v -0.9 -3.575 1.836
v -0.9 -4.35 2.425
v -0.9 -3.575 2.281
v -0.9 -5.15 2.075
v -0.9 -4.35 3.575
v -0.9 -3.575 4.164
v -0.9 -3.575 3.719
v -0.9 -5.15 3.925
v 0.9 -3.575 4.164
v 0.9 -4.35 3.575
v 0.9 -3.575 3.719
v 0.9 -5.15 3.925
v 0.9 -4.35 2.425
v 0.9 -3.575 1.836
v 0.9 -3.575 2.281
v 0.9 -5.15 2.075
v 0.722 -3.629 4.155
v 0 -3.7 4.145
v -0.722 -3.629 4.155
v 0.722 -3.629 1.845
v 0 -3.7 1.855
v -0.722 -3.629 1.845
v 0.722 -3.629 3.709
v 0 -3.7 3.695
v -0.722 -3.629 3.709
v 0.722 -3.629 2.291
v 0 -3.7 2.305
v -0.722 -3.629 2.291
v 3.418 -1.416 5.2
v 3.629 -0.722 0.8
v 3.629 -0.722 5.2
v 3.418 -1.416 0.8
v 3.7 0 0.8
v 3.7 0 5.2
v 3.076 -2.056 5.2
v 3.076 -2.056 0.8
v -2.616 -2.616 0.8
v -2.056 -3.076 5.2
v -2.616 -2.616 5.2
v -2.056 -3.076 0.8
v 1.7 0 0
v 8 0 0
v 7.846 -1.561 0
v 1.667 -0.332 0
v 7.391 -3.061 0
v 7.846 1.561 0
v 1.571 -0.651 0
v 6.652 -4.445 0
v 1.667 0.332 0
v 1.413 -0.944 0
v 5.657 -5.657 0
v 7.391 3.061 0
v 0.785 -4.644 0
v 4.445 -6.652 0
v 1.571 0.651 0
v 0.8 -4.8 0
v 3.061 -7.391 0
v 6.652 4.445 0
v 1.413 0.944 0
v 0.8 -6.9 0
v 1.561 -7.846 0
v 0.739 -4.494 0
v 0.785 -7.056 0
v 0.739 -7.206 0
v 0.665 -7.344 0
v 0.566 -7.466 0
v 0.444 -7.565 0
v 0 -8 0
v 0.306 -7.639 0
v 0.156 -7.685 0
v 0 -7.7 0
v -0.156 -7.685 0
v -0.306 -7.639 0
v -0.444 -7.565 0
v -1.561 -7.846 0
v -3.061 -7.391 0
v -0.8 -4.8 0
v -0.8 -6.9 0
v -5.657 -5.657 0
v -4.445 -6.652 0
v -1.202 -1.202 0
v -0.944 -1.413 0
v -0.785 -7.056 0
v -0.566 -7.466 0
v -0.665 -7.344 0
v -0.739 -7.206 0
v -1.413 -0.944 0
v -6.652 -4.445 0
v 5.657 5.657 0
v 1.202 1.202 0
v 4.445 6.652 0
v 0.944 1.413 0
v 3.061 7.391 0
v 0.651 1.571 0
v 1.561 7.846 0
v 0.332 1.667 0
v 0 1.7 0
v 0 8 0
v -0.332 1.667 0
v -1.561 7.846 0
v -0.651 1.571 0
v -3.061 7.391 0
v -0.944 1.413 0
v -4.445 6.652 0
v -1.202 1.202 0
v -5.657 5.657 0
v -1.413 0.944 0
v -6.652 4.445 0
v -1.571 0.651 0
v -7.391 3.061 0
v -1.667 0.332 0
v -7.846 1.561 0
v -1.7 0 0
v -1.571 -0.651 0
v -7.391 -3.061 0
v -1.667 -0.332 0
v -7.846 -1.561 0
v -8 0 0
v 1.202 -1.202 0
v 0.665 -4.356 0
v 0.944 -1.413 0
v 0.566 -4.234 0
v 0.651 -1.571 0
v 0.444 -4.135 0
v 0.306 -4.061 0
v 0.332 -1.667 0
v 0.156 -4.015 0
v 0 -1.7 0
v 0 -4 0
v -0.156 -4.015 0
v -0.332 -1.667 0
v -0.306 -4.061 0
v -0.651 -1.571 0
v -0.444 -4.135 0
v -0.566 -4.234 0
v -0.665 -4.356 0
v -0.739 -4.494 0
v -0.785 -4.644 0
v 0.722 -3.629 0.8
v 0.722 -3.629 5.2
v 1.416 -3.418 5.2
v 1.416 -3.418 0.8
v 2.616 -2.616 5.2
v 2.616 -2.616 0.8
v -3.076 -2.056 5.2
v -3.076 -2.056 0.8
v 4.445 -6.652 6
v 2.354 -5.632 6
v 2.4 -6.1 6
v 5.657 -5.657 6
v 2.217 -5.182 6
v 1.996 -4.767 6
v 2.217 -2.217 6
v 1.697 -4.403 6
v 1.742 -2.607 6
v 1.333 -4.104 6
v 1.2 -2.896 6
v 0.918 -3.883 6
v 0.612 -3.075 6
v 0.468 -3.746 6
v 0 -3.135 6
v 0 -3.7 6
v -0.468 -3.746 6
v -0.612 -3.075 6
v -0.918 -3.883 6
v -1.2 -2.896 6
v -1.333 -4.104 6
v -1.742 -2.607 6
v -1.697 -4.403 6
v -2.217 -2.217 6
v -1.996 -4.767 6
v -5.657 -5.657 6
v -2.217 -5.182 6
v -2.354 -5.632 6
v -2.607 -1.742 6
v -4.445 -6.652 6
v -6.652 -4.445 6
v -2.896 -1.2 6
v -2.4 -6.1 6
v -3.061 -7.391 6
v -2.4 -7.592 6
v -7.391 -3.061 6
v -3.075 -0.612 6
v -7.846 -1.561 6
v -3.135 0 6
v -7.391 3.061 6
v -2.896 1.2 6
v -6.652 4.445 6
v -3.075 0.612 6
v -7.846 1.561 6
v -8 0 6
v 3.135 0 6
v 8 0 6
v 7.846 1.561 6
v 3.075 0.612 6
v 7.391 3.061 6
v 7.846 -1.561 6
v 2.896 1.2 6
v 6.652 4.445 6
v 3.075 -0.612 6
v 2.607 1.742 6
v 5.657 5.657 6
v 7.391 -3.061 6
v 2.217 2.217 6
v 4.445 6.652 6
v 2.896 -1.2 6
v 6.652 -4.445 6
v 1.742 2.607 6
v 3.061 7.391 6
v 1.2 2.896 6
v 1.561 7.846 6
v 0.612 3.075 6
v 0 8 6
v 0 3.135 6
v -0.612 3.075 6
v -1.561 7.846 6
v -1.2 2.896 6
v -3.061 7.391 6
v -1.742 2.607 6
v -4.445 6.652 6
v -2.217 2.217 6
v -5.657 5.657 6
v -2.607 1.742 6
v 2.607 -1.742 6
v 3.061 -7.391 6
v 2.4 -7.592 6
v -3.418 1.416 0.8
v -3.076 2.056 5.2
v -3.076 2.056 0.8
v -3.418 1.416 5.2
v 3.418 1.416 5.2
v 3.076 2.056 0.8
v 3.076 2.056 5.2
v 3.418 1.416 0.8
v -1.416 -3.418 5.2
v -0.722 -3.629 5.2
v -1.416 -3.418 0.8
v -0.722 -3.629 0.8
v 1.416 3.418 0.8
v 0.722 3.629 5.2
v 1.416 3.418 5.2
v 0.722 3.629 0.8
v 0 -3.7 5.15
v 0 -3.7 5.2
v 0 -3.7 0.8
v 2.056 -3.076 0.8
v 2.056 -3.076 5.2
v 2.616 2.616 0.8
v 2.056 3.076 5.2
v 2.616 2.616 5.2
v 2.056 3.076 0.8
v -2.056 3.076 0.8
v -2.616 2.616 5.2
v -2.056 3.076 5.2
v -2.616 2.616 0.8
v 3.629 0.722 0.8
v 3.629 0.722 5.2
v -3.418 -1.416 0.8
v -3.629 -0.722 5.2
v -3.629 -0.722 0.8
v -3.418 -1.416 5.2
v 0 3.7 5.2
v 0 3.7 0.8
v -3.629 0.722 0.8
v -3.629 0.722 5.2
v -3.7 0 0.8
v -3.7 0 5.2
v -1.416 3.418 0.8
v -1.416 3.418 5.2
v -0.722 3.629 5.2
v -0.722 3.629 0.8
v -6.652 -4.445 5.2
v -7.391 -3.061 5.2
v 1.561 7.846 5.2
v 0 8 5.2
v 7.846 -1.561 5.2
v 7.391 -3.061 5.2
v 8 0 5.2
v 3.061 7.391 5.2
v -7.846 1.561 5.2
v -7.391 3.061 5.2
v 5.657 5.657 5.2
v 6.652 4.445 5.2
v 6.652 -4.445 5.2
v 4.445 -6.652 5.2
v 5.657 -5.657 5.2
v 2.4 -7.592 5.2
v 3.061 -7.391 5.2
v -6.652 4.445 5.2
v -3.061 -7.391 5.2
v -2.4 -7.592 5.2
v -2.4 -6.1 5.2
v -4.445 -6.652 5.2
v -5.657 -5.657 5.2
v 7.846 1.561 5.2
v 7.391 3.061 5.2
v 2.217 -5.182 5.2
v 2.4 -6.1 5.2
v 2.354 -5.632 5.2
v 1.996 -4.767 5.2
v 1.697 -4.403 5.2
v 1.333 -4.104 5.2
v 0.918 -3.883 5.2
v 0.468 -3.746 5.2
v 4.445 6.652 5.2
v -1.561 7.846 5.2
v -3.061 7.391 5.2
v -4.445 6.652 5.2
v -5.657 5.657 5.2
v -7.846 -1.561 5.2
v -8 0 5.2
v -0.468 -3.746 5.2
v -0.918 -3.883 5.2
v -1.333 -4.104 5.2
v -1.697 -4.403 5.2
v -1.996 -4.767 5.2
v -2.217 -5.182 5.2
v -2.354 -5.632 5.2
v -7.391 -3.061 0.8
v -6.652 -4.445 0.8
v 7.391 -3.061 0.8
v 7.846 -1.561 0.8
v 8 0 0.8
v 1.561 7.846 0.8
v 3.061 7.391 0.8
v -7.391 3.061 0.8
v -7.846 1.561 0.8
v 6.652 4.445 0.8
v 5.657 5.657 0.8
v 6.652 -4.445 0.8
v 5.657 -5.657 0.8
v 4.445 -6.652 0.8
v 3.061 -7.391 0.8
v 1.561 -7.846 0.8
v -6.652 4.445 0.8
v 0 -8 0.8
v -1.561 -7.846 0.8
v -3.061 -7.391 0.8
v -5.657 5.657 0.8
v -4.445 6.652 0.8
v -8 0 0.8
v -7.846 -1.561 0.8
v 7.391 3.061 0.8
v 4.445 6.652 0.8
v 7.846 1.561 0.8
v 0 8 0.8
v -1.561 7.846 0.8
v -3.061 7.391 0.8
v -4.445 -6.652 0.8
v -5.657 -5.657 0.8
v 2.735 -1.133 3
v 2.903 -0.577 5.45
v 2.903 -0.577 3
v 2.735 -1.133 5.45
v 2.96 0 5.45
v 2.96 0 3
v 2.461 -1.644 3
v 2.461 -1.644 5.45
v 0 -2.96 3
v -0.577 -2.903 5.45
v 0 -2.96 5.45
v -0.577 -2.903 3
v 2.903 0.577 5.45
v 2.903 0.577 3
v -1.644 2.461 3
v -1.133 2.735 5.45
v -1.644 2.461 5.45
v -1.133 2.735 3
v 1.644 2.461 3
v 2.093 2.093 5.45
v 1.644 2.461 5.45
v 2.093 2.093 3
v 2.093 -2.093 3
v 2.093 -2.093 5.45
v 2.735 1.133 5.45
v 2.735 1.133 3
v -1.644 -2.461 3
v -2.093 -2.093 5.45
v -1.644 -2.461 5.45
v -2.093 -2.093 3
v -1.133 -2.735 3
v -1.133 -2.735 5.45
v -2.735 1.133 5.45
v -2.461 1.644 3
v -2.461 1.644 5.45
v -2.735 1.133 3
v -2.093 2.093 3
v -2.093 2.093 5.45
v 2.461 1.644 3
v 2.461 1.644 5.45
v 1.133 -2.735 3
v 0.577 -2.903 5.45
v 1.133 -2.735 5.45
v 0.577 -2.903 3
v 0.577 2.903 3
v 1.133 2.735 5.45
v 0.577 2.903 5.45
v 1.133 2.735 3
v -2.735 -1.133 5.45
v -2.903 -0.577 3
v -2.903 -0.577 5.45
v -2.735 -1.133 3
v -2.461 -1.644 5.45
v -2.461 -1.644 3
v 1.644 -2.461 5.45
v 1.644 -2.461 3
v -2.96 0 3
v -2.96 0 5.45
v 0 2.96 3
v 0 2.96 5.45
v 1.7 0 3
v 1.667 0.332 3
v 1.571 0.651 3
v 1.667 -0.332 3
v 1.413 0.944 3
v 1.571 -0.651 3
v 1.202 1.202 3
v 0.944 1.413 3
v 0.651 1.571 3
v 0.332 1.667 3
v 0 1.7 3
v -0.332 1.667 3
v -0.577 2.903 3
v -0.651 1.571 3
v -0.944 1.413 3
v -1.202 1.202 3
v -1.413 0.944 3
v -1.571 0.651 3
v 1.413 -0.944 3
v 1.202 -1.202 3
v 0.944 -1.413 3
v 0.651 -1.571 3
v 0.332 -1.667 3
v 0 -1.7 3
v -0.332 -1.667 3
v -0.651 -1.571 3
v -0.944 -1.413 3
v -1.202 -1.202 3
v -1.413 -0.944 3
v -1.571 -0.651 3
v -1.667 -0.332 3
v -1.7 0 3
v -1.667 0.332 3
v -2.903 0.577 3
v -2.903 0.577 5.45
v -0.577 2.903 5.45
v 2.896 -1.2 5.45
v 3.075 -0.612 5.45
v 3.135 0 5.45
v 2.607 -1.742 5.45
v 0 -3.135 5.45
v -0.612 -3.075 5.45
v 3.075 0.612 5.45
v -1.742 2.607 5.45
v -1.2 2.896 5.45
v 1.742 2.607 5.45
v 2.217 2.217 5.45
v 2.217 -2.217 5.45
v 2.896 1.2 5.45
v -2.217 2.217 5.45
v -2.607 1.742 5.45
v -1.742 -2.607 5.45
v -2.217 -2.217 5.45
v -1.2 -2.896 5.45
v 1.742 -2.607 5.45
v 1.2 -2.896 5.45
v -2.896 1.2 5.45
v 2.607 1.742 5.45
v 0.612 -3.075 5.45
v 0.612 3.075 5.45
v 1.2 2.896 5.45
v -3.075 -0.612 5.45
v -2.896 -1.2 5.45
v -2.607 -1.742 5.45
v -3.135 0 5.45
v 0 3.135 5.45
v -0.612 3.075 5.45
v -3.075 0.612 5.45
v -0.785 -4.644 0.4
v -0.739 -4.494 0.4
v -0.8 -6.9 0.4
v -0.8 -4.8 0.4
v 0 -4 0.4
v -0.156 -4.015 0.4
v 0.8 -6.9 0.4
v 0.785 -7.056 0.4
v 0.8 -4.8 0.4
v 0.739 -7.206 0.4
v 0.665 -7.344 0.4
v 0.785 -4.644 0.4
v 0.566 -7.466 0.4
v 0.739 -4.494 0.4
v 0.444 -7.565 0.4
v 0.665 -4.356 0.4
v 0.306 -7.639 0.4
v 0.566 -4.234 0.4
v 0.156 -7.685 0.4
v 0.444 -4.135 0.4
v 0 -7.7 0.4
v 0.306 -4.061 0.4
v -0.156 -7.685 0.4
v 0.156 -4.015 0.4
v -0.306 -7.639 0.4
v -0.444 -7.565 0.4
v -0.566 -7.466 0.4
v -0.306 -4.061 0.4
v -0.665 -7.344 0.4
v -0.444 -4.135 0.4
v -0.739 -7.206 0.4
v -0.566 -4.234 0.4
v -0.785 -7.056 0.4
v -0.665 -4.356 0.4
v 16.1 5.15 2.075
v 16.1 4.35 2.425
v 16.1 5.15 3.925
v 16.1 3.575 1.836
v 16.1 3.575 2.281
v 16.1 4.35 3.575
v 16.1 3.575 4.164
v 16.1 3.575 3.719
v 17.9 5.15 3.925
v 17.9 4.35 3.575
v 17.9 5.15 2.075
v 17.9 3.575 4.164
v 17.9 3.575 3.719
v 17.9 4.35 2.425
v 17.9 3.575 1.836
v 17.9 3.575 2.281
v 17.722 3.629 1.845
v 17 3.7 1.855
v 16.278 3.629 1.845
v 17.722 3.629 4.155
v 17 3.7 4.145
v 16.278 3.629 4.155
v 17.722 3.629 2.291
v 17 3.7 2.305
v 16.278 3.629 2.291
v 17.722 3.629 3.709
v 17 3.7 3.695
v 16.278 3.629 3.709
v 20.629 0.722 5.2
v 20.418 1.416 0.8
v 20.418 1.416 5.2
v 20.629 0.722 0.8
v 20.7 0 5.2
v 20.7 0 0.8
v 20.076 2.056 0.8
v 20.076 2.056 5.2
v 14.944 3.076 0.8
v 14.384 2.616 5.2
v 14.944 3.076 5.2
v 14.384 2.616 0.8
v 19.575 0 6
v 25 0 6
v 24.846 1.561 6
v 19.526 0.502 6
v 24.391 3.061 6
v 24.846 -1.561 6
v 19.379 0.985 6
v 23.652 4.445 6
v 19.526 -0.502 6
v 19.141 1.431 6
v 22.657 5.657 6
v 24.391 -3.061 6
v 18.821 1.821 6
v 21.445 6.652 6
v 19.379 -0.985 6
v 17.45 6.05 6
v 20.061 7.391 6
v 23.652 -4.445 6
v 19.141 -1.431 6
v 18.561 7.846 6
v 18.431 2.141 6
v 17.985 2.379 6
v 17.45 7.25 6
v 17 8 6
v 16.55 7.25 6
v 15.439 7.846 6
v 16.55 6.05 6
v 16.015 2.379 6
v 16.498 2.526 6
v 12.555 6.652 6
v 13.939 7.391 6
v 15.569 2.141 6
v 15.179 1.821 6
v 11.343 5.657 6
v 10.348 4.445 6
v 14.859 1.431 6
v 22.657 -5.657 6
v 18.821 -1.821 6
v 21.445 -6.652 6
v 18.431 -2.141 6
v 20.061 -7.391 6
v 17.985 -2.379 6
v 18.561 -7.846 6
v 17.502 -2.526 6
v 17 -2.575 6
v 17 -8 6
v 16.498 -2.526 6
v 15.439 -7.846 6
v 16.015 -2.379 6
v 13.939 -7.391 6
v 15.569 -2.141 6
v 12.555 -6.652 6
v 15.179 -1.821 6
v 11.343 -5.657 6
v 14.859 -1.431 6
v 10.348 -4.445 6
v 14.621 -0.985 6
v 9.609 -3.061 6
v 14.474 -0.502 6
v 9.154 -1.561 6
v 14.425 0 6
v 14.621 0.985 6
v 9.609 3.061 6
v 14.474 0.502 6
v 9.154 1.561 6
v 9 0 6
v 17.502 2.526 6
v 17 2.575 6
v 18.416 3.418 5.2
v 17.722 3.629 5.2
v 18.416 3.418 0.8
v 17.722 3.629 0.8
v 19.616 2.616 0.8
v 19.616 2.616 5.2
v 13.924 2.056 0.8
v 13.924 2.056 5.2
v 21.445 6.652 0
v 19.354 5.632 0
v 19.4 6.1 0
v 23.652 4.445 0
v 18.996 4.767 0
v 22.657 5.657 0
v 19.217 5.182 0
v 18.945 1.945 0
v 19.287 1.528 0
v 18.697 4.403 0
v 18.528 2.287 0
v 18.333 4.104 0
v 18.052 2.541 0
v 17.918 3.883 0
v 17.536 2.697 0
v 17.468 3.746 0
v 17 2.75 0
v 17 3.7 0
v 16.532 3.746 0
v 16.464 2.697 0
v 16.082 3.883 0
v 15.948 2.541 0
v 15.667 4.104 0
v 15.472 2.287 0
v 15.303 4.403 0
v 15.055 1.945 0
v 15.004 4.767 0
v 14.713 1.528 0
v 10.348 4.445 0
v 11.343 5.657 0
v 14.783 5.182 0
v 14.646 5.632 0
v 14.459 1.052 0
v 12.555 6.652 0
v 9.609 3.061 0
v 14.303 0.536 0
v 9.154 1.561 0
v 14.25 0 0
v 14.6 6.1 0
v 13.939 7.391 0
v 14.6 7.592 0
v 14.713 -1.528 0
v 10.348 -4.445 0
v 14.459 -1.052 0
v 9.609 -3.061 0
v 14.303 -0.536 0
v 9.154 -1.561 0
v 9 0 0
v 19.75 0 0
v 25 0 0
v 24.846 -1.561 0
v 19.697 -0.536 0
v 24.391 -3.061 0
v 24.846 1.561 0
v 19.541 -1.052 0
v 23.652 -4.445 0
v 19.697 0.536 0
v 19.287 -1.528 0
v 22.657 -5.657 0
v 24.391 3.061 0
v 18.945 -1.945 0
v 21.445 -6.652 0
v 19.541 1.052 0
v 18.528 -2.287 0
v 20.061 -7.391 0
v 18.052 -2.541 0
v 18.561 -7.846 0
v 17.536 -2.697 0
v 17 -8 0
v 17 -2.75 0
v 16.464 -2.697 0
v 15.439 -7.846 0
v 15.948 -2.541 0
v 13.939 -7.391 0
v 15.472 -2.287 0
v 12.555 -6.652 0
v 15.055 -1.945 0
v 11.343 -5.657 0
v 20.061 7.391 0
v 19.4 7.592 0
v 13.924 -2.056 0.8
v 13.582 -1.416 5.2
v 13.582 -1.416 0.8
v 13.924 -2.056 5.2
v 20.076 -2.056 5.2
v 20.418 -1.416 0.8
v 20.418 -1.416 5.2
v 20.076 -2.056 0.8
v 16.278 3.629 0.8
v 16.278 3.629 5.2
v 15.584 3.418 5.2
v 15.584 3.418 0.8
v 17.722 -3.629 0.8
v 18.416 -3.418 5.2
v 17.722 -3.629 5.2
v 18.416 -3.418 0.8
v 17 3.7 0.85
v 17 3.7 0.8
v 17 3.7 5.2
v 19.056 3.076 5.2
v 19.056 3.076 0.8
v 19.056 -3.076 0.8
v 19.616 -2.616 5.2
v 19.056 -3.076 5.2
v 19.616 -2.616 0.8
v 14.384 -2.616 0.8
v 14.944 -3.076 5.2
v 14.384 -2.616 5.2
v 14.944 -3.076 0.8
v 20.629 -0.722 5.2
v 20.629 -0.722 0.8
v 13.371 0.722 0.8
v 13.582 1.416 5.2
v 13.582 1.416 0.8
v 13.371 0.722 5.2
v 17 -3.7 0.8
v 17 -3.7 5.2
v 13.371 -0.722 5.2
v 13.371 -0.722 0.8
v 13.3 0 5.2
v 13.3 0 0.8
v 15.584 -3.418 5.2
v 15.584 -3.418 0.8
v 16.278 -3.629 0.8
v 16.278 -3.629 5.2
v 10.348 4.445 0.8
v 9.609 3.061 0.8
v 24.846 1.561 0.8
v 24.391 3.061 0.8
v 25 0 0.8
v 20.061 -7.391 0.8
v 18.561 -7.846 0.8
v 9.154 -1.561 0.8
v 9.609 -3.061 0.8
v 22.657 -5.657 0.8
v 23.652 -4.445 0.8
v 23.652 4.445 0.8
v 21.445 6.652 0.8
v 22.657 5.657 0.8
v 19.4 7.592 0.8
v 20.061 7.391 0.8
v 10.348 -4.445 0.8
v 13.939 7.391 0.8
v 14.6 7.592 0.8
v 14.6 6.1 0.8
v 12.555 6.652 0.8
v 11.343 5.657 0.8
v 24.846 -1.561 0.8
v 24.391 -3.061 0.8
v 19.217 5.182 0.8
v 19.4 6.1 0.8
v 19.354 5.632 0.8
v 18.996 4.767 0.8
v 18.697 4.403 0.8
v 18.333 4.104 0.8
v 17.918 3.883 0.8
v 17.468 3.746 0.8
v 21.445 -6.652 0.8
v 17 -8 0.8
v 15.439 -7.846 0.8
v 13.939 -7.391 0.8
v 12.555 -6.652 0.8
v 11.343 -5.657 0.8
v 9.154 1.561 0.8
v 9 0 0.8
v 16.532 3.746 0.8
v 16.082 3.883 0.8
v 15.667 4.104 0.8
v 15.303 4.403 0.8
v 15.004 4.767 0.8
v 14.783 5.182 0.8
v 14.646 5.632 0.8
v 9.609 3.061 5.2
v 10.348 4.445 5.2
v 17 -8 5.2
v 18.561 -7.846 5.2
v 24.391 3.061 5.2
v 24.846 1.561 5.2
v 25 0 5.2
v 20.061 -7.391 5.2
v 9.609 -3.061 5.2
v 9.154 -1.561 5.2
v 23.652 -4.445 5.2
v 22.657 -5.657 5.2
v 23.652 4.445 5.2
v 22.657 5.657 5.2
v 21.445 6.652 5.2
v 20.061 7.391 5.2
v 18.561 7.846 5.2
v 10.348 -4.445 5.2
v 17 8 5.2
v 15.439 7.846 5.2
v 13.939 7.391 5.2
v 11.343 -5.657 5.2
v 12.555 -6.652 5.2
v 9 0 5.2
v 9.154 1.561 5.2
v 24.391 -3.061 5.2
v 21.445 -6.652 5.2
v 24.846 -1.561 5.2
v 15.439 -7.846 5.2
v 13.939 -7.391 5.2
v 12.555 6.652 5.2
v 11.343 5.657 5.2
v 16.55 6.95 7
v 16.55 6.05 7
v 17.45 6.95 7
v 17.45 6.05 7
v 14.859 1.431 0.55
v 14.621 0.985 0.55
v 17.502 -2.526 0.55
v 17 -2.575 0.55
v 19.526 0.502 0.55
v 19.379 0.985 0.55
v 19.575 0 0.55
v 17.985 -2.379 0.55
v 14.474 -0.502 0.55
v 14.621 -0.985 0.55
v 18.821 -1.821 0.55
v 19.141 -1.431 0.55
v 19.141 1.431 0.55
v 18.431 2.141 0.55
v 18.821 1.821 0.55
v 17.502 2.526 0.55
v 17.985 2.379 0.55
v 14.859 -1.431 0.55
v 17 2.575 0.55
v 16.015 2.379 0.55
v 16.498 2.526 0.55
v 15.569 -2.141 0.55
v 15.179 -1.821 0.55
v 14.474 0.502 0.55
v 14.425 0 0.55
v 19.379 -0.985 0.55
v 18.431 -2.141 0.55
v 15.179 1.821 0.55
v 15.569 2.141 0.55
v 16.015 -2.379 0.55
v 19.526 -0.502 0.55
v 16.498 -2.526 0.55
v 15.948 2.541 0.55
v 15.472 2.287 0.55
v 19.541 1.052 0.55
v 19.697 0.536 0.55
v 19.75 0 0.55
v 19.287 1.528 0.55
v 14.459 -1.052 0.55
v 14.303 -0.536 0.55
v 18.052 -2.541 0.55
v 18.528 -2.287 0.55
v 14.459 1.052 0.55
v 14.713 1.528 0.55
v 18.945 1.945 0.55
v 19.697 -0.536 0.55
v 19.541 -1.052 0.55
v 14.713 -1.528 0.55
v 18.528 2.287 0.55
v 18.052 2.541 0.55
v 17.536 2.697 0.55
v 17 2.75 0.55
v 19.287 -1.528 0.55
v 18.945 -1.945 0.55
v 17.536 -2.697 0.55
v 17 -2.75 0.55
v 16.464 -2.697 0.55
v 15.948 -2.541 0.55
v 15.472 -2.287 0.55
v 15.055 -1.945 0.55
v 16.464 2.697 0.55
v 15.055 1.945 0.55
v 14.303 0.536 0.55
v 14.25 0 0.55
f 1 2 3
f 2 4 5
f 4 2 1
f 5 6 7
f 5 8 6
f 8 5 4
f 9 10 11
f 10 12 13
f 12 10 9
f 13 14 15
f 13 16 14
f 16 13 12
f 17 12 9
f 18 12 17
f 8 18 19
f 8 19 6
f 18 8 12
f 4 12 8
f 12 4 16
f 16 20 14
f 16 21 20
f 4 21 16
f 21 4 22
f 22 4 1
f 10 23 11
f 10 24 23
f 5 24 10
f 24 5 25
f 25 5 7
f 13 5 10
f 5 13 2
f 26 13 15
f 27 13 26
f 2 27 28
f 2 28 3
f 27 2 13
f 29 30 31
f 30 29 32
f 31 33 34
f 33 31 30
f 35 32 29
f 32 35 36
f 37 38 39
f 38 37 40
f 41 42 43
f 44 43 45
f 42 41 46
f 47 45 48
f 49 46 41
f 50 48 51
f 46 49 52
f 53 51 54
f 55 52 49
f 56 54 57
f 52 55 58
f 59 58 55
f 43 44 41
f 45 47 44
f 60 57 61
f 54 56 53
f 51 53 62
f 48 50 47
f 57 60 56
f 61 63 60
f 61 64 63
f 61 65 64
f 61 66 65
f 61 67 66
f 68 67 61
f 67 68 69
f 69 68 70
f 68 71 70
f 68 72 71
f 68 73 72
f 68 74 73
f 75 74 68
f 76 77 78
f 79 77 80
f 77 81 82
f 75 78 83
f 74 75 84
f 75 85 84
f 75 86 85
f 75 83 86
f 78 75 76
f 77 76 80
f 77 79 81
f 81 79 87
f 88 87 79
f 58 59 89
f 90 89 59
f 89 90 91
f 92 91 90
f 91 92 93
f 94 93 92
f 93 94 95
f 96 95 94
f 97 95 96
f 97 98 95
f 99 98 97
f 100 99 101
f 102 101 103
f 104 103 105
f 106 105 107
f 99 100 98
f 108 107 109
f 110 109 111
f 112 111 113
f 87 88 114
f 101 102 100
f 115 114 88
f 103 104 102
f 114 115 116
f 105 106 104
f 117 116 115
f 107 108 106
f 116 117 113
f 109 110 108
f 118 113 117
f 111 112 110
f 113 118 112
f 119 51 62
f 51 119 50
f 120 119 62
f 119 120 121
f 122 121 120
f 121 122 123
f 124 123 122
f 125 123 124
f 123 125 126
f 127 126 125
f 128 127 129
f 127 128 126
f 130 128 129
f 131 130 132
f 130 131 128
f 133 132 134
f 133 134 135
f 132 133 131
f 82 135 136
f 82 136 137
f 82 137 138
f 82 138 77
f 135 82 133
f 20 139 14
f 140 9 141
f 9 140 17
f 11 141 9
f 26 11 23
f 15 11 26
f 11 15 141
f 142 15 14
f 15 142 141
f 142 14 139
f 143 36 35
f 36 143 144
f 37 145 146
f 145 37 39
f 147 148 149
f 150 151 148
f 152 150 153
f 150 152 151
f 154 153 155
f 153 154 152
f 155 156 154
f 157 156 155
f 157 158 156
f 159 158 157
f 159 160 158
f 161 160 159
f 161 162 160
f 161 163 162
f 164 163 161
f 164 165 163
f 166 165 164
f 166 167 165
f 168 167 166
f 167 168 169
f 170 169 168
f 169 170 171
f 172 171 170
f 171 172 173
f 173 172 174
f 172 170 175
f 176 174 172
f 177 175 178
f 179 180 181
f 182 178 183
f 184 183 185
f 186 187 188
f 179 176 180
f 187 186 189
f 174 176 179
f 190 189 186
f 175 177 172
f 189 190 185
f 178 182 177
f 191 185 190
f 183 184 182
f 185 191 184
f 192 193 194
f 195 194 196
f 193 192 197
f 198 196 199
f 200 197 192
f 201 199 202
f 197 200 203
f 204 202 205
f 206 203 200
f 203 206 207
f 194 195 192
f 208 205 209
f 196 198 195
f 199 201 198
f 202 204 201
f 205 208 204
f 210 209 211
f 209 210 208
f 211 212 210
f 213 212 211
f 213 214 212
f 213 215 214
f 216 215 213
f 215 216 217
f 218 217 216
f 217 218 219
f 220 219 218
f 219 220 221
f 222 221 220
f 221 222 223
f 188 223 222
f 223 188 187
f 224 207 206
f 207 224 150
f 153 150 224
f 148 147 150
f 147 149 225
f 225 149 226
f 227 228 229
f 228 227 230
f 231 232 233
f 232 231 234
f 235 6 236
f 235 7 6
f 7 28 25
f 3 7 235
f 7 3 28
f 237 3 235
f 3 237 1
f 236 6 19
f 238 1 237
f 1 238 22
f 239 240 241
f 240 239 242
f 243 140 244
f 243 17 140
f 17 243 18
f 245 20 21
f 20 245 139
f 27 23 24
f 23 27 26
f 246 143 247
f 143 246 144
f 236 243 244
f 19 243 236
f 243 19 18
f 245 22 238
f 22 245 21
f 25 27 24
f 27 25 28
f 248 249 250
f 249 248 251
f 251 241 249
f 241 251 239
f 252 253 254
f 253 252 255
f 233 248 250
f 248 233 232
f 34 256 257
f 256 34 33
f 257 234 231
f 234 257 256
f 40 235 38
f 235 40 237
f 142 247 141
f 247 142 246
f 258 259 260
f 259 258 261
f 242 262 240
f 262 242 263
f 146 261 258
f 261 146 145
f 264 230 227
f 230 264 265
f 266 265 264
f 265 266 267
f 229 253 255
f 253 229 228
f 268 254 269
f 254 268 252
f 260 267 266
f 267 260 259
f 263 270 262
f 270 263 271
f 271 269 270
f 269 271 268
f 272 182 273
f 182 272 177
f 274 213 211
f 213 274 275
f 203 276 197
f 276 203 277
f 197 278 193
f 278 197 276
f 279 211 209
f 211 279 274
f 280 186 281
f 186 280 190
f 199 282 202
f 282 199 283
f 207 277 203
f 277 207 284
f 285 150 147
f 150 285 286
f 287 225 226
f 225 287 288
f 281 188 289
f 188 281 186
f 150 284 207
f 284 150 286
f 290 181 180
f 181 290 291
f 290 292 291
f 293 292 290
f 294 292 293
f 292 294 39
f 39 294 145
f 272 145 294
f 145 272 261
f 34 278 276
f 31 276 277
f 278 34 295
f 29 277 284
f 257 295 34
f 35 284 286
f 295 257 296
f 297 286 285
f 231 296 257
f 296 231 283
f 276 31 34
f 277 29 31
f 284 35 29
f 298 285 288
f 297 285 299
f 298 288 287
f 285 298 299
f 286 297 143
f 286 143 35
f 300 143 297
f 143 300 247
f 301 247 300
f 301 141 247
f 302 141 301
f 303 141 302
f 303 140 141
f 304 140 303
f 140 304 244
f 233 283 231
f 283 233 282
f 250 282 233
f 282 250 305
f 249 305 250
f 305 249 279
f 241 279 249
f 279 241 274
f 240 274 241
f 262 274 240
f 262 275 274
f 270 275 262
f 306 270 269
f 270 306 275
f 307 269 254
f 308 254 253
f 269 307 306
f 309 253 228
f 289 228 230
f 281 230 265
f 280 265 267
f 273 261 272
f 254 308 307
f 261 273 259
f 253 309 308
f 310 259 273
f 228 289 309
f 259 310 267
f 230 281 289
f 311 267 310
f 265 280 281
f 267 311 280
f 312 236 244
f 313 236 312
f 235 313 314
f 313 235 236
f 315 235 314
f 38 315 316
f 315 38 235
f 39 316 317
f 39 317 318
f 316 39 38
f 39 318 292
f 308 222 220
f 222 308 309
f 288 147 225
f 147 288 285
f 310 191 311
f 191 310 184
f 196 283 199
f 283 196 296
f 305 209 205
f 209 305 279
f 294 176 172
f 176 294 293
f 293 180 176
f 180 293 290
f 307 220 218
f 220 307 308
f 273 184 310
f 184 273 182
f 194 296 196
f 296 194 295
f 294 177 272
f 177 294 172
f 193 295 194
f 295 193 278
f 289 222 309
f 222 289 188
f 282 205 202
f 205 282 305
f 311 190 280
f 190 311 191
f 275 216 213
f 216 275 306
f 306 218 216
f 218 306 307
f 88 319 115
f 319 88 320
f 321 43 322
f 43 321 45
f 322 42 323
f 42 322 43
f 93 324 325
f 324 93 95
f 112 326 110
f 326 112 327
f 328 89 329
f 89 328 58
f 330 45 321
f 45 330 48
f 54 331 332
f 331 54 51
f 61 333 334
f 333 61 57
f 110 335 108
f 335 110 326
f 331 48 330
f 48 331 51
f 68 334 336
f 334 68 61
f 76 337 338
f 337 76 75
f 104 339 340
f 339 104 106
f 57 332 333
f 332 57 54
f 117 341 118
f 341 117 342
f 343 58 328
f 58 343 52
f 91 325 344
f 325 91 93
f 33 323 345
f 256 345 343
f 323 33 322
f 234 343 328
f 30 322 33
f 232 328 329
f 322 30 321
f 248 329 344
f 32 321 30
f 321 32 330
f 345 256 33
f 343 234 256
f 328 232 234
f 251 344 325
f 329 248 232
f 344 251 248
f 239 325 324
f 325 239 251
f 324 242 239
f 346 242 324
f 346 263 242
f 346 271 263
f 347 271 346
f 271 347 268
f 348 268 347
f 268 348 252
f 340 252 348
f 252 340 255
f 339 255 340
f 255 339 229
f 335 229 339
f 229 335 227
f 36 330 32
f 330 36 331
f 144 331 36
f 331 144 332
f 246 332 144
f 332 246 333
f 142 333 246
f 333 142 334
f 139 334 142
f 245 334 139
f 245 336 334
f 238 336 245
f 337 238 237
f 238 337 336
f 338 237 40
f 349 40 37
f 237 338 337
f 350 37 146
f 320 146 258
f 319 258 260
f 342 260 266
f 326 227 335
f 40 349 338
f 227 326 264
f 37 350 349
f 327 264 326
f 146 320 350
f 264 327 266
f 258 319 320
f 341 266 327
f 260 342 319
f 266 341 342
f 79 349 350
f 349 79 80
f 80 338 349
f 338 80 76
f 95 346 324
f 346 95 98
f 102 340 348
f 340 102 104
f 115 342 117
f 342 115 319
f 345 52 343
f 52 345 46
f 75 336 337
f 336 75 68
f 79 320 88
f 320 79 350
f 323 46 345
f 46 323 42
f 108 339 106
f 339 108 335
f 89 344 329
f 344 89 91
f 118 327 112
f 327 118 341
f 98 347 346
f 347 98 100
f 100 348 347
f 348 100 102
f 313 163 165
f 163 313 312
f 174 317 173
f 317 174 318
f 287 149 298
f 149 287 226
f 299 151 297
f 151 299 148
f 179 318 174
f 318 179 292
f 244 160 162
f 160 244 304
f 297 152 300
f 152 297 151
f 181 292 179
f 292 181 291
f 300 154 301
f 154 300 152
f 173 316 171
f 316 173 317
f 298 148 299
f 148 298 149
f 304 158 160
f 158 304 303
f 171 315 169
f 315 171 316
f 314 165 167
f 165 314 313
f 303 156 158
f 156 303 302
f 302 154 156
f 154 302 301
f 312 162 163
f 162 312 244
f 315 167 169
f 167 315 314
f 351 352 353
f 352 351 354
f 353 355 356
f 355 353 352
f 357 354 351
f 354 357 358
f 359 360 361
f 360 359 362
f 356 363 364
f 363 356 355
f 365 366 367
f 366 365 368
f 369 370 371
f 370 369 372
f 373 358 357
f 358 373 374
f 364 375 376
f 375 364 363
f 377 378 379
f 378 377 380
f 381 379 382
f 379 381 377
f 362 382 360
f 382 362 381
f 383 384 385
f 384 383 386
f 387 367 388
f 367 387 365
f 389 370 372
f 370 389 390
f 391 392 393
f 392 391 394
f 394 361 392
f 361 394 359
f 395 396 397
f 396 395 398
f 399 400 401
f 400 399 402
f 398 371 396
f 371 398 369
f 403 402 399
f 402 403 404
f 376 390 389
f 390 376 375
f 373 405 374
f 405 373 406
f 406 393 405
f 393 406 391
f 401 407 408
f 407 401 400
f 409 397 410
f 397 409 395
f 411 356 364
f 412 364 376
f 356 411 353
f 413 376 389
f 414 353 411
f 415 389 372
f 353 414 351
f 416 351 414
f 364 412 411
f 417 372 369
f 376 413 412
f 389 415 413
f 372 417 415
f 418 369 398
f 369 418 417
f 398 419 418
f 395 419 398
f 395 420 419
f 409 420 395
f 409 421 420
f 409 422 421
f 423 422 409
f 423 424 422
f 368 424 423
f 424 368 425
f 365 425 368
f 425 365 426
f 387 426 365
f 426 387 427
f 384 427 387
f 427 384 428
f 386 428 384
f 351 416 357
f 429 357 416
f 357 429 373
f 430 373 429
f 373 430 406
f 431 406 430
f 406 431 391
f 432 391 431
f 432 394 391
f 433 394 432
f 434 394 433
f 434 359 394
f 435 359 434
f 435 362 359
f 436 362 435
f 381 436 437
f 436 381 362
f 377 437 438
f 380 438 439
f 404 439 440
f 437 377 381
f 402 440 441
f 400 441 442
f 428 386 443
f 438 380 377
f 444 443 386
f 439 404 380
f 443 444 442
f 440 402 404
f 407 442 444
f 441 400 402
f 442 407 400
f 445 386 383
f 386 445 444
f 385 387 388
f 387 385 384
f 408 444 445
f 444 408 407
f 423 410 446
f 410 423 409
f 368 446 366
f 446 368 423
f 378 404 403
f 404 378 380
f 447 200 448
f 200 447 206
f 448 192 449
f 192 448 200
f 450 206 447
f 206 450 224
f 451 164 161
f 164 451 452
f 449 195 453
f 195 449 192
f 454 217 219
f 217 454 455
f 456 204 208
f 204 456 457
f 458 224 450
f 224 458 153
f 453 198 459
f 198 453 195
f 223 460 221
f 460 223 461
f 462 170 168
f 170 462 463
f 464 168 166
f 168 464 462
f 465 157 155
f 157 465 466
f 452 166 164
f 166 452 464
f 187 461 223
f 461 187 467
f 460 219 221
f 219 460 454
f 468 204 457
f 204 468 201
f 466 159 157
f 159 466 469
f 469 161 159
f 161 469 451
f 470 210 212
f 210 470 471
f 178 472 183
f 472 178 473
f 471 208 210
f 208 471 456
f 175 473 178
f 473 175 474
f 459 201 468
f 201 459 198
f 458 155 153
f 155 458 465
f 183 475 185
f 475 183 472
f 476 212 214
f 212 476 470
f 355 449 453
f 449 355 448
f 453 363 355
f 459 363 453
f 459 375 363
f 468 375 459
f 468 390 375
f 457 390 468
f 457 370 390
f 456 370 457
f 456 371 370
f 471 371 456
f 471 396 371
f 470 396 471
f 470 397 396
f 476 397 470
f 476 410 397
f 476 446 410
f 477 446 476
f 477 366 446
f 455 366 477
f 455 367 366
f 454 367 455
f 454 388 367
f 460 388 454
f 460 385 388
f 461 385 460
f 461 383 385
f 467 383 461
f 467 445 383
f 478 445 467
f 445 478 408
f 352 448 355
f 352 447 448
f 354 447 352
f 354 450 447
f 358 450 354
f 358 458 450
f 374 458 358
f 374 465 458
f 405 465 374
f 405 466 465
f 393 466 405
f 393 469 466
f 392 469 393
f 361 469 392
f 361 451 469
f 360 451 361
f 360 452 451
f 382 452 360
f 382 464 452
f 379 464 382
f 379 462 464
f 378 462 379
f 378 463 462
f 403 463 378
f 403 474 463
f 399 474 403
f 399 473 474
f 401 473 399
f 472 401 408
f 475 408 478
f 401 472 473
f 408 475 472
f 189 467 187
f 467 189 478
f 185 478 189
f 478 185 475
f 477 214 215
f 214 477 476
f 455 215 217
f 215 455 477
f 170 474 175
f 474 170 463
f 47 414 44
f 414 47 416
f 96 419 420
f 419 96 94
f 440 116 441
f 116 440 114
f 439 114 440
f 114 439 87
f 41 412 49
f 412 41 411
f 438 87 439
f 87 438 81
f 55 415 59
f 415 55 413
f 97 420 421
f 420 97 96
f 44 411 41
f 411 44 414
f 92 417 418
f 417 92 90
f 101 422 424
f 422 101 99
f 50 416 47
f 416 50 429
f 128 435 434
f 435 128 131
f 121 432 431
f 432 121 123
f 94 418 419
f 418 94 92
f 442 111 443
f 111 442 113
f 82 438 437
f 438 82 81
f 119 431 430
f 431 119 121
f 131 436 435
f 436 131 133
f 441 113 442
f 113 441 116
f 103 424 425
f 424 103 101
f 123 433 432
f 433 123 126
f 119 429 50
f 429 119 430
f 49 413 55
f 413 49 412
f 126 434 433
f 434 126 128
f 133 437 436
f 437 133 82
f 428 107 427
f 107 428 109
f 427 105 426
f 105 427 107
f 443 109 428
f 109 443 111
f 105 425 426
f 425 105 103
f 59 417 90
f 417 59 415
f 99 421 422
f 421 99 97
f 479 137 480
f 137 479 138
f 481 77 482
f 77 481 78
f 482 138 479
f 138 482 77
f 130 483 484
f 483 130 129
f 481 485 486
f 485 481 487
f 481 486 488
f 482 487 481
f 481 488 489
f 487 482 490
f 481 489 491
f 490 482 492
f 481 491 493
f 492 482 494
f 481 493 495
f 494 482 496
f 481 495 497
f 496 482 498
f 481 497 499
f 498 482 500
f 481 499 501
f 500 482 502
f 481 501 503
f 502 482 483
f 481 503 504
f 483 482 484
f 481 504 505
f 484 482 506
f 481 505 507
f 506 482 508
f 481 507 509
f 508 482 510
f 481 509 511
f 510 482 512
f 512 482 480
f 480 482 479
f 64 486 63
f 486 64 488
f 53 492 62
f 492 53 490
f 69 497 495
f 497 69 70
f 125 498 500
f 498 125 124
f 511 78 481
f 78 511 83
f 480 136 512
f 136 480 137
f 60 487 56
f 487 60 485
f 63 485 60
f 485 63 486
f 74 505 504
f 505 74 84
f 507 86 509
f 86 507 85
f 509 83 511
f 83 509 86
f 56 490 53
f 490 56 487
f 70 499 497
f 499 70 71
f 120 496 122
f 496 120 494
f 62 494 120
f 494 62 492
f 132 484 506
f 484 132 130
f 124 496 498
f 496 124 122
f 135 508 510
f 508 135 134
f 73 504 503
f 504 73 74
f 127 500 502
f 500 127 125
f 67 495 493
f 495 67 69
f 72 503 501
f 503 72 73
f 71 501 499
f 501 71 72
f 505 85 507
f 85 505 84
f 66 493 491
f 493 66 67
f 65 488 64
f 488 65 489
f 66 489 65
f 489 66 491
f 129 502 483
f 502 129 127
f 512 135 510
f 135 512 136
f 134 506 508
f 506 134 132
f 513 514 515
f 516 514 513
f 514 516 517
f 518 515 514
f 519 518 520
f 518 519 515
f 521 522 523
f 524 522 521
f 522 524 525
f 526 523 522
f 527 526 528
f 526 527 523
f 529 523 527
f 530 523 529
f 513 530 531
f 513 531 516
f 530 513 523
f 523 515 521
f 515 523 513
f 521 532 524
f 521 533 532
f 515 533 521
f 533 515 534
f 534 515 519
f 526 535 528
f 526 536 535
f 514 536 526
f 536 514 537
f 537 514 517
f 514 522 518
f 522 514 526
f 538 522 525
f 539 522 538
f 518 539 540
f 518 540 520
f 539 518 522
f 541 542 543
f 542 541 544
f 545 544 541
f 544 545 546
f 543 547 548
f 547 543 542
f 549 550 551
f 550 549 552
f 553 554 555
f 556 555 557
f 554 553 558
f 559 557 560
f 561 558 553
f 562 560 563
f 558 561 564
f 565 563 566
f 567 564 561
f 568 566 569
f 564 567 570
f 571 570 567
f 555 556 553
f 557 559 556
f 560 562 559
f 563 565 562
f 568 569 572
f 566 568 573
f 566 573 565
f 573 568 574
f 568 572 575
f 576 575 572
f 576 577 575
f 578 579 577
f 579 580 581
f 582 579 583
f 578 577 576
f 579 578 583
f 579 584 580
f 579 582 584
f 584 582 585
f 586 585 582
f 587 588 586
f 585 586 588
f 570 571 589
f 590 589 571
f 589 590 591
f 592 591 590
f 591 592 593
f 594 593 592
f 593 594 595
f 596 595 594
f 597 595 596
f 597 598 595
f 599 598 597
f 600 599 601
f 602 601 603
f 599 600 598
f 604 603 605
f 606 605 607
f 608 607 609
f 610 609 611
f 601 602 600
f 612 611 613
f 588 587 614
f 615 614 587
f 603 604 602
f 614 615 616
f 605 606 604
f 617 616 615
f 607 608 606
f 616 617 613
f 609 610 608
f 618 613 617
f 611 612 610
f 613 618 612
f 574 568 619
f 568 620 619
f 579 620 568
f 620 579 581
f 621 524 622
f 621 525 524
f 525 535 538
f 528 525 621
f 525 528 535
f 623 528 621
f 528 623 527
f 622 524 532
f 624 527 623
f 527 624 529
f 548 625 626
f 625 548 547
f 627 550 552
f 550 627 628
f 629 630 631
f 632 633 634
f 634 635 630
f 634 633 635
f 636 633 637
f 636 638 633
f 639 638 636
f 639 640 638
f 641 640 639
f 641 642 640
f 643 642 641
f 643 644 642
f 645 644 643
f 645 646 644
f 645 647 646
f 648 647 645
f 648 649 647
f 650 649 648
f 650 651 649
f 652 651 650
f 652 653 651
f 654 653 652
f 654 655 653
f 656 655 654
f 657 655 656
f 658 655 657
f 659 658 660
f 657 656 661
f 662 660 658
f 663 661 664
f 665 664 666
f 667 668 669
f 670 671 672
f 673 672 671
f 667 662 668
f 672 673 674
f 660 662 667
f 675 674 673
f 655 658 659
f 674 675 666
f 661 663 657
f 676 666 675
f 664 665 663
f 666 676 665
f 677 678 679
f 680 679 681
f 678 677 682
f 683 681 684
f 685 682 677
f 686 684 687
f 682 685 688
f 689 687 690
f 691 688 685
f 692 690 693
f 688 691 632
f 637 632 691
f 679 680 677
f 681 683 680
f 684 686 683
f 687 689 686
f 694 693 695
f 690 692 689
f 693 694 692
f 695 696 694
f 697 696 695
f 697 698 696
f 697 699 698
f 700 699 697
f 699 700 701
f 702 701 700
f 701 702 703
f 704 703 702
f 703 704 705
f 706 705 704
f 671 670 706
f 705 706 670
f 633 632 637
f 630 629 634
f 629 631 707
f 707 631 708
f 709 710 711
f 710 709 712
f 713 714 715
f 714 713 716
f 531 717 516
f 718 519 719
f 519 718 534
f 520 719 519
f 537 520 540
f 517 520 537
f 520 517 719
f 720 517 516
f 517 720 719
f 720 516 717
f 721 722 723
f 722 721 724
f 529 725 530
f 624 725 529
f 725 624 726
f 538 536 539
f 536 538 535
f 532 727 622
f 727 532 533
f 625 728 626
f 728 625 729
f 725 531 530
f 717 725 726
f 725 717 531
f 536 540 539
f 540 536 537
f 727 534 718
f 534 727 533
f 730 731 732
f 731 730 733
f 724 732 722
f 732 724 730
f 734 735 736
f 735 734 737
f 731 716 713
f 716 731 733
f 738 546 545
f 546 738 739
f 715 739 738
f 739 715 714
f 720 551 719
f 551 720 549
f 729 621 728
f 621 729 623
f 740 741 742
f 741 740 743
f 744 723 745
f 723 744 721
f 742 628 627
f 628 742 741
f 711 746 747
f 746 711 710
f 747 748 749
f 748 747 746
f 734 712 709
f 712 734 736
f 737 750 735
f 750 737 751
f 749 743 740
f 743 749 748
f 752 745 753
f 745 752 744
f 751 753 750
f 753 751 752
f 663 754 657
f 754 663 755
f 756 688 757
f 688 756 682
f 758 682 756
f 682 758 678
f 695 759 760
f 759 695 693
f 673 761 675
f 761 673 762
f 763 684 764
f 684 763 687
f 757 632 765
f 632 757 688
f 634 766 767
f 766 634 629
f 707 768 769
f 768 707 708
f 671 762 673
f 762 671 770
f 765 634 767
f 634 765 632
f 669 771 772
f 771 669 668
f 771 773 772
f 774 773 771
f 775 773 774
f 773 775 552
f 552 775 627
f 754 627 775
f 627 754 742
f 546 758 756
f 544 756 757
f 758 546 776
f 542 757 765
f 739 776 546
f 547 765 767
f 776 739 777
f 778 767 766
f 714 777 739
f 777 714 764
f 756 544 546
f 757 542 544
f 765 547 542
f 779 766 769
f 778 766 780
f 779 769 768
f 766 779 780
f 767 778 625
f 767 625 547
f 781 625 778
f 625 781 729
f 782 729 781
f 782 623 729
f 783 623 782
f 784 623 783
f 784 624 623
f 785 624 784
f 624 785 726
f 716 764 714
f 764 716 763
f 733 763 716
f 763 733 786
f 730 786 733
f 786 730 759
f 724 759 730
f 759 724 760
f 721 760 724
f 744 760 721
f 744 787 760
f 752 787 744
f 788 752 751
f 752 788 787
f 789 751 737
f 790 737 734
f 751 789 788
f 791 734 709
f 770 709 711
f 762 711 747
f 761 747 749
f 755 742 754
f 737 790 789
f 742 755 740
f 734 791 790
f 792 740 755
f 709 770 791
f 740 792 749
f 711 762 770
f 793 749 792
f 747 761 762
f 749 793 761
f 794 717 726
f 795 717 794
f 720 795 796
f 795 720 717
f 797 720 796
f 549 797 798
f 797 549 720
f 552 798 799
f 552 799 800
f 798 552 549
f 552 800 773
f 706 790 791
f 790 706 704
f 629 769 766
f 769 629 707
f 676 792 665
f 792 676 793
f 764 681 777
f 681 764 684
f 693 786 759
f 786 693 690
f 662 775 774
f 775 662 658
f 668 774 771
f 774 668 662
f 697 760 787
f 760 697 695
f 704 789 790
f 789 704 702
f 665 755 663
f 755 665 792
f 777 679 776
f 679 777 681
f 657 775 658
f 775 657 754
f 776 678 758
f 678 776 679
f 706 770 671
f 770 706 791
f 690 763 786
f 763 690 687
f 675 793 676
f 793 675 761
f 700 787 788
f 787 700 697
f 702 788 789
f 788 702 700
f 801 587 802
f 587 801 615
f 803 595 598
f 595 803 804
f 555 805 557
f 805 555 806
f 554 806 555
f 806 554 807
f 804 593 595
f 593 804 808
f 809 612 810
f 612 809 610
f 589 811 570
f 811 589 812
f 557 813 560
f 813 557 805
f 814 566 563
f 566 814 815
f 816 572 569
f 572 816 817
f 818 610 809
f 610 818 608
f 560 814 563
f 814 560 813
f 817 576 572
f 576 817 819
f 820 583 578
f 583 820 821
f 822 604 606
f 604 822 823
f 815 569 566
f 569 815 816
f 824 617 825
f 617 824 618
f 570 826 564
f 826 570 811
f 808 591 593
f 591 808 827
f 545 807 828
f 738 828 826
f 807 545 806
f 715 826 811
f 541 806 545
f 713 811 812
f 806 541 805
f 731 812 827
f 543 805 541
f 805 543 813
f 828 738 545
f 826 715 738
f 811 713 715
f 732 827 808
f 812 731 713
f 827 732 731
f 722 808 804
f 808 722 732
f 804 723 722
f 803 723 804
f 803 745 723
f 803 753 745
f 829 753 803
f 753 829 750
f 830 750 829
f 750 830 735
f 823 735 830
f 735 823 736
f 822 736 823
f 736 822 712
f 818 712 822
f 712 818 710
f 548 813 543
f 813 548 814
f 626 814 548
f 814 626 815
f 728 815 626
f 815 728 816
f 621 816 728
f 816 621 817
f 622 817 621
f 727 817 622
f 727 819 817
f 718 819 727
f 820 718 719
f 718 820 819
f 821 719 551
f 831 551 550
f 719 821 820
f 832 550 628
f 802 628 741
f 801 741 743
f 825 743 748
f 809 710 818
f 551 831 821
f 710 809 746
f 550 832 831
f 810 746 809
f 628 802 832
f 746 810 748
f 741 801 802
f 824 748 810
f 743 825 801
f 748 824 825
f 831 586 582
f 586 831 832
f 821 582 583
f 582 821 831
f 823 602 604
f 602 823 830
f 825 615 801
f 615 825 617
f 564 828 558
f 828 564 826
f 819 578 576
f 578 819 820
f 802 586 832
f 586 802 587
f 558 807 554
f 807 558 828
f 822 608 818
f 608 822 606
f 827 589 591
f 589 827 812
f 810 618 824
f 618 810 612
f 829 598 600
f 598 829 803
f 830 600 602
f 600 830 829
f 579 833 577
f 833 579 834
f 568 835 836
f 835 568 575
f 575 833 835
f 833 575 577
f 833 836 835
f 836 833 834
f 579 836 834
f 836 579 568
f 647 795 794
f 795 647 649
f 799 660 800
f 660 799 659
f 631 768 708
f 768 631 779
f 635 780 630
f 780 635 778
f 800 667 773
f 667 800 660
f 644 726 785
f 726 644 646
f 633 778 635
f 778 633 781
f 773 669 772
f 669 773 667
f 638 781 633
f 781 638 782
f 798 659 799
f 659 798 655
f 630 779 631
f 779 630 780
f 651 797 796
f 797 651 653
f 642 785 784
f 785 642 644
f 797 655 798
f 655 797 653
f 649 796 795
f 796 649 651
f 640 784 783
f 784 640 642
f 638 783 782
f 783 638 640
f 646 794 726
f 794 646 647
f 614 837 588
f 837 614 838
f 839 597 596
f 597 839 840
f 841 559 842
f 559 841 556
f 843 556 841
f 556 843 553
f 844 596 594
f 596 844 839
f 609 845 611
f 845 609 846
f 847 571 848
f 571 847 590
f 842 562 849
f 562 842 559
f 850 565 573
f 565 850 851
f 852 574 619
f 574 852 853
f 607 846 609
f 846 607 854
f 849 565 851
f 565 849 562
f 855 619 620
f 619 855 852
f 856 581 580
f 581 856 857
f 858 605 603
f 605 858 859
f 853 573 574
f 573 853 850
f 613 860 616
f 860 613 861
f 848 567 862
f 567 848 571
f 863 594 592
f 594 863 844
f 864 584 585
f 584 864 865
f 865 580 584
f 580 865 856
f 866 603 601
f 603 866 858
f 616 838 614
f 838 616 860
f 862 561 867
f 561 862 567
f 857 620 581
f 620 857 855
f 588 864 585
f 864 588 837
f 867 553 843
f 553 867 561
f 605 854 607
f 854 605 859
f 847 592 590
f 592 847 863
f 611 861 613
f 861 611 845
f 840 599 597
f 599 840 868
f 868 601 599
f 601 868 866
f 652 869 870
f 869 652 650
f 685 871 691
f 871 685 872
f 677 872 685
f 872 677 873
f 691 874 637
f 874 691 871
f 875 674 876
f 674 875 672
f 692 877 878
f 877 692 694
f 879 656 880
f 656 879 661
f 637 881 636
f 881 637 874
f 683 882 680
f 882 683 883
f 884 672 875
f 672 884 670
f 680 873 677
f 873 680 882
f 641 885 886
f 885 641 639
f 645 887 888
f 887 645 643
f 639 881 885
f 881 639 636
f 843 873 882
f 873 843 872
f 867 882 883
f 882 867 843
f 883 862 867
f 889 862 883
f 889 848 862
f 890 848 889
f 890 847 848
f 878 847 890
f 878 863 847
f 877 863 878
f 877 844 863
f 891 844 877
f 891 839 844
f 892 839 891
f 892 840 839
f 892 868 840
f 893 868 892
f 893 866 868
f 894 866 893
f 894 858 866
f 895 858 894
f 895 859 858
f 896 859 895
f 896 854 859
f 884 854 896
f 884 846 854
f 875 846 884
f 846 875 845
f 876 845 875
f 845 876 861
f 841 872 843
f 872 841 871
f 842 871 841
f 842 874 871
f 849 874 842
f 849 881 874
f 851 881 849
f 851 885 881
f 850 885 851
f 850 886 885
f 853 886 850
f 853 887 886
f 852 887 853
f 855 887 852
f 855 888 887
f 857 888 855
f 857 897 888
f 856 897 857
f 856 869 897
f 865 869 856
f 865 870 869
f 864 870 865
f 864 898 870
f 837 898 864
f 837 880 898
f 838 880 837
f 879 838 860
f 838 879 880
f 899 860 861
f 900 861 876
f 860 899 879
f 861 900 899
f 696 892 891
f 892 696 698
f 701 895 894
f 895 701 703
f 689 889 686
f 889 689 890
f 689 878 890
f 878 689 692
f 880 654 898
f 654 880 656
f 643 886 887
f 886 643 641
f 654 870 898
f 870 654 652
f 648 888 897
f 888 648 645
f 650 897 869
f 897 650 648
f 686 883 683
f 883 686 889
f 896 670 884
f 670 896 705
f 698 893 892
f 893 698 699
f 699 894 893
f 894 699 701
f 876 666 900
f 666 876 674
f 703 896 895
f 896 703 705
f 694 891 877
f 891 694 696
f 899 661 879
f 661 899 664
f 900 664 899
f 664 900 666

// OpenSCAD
// DOUBLE TAKE FRAMES DESIGN RELEASE CANDIDATE
// DTF_RELEASE_CANDIDATE: 1.1.0-rc.1
// Prepared: 2026-08-30
// Versioning: Semantic Versioning 2.0.0 (https://semver.org/)
// Status: PENDING CANON — not a public release
// Candidate changes:
// - Coordinates captive 16 mm-flange capstans with the revised clock-string guide.
// - Requires physical fit, rotation, and line-containment testing before promotion.
//
// MOCKUP ONLY — larger-flange variant of canonical Capstans.scad.
// Source reviewed: canonical files/Capstans.scad (2026-08-26).
//
// The capstans use 16 mm flanges. The hour horn is moved outward to suit that
// flange, and the upside-down minute capstan uses a recessed orientation mark.
// Canonical bores, drum geometry, heights, and the eyelet's 9 mm datum remain.

$fn = 32;
eps = 0.05;

// Selected fits retained from canonical. These modeled bores deliberately
// differ from the supplied movement-member ODs: 3.17 mm inner and 5.05 mm
// middle. They are fit dimensions, not transcriptions of movement specs.
minute_bore_d = is_undef(shared_minute_capstan_bore_d)
    ? 3.40 : shared_minute_capstan_bore_d;
hour_bores = [5.15];
minute_lower_clearance_d = 5.92;
minute_lower_clearance_h = 3.0; // Preserve canonical transition datum.

// Main geometry. The added height moves only the upper flange; established
// lower seating, anchor, and minute-bore-transition datums remain unchanged.
canonical_total_h = 5.0;
total_h = is_undef(shared_capstan_total_h)
    ? 6.0 : shared_capstan_total_h;
flange_h = 0.80;
drum_d = 7.4; // Printed winding-drum OD; unrelated to movement sleeve specs.
flange_d = is_undef(shared_capstan_flange_d)
    ? 16.0 : shared_capstan_flange_d; // MOCKUP: canonical is 9.0
eyelet_reference_flange_d = 9.0; // Keep canonical eyelet outer position.
bore_mouth_extra = 0.35;
bore_mouth_h = 0.55;
part_spacing_x = flange_d+1;     // Preserve 1 mm between enlarged parts.

// Bottom-flange installation key. It shares the fixed beak/string-anchor
// radial datum (+Y) and cannot accept the beak when the capstan is upside down.
bottom_insertion_notch_enabled = is_undef(shared_bottom_insertion_notch_enabled)
    ? true : shared_bottom_insertion_notch_enabled;
bottom_insertion_notch_clearance_per_side =
    is_undef(shared_beak_notch_clearance_per_side)
        ? 0.40 : shared_beak_notch_clearance_per_side;
bottom_insertion_notch_w_x =
    (is_undef(shared_beak_tangential_w) ? 4.0 : shared_beak_tangential_w)
    + 2*bottom_insertion_notch_clearance_per_side;

// ---------- sacrificial print supports ----------

breakaway_supports_enabled = false;
breakaway_support_count = 6;
breakaway_post_radius = 7.3;
breakaway_body_d = 1.2;
breakaway_neck_d = 0.65;
breakaway_neck_h = 0.30;

// Existing external string anchor retained unchanged.
string_eyelet_enabled = true;
string_eyelet_flange_gap_z = 0.60;
string_eyelet_w_x = 1.8;
string_eyelet_drum_overlap_y = 0.20;
string_eyelet_beyond_flange_y = is_undef(shared_string_eyelet_beyond_flange_y)
    ? 0.65 : shared_string_eyelet_beyond_flange_y;
string_eyelet_inner_face_h_z = 2.35;
string_eyelet_outer_face_h_z = 1.85;
string_eyelet_wall_z = 0.35;
string_eyelet_outer_wall_y = 0.8;    // Retain canonical hook-tip strength.
string_eyelet_void_inset_y = 0.70;

// Hour indicator horn: canonical size shifted radially toward the 16 mm rim.
indicator_horn_enabled = true;
indicator_horn_inner_y = 6.05;
indicator_horn_outer_y = 7.25;
indicator_horn_w_x = 0.90;
indicator_horn_h_z = 1.00;
indicator_horn_taper_y = 0.30;

// Bed-facing rounded orientation mark for the upside-down minute capstan.
// It stays inside the retaining rim and does not cut through the 0.8 mm flange.
minute_mark_w_x = 1.6;
minute_mark_y0 = 4.8;
minute_mark_y1 = 6.9;
minute_mark_depth_z = 0.40;

module cyl(d, h, z=0) {
    translate([0, 0, z]) cylinder(d=d, h=h);
}

module prism_x(points_yz, w_x) {
    n = len(points_yz);
    polyhedron(
        points = concat(
            [for (p = points_yz) [-w_x/2, p[0], p[1]]],
            [for (p = points_yz) [ w_x/2, p[0], p[1]]]
        ),
        faces = concat(
            [[for (i = [n-1:-1:0]) i]],
            [[for (i = [0:n-1]) i+n]],
            [for (i = [0:n-1]) [i, (i+1)%n, ((i+1)%n)+n, i+n]]
        )
    );
}

module top_indicator_horn(enabled=indicator_horn_enabled) {
    if (enabled)
        prism_x(
            [
                [indicator_horn_inner_y, total_h],
                [indicator_horn_outer_y, total_h],
                [indicator_horn_outer_y-indicator_horn_taper_y, total_h+indicator_horn_h_z],
                [indicator_horn_inner_y, total_h+indicator_horn_h_z]
            ],
            indicator_horn_w_x
        );
}

function eyelet_channel_z0() = flange_h + string_eyelet_flange_gap_z;
function eyelet_channel_z1() = total_h - flange_h - string_eyelet_flange_gap_z;
function eyelet_mid_z() = total_h/2; // Recenter with beak in widened gap.
function eyelet_inner_y() = drum_d/2 - string_eyelet_drum_overlap_y;
function eyelet_outer_y() = eyelet_reference_flange_d/2 + string_eyelet_beyond_flange_y;
function eyelet_inner_z0() = eyelet_mid_z() - string_eyelet_inner_face_h_z/2;
function eyelet_inner_z1() = eyelet_mid_z() + string_eyelet_inner_face_h_z/2;
function eyelet_outer_z0() = eyelet_mid_z() - string_eyelet_outer_face_h_z/2;
function eyelet_outer_z1() = eyelet_mid_z() + string_eyelet_outer_face_h_z/2;
function eyelet_void_inner_y() = drum_d/2 - string_eyelet_void_inset_y;
function eyelet_void_outer_y() = eyelet_outer_y() - string_eyelet_outer_wall_y;
function eyelet_void_inner_z0() = eyelet_inner_z0() + string_eyelet_wall_z;
function eyelet_void_inner_z1() = eyelet_inner_z1() - string_eyelet_wall_z;
function eyelet_void_outer_z0() = eyelet_outer_z0() + string_eyelet_wall_z;
function eyelet_void_outer_z1() = eyelet_outer_z1() - string_eyelet_wall_z;

module flipped_trapezoid_eyelet_solid_body() {
    intersection() {
        prism_x(
            [
                [eyelet_inner_y(), eyelet_inner_z0()],
                [eyelet_outer_y(), eyelet_outer_z0()],
                [eyelet_outer_y(), eyelet_outer_z1()],
                [eyelet_inner_y(), eyelet_inner_z1()]
            ],
            string_eyelet_w_x
        );
        translate([0, 0, total_h/2])
            cube([flange_d+2, flange_d+2, eyelet_channel_z1()-eyelet_channel_z0()], center=true);
    }
}

module flipped_trapezoid_eyelet_inner_polygon_void() {
    prism_x(
        [
            [eyelet_void_inner_y(), eyelet_void_inner_z0()],
            [eyelet_void_outer_y(), eyelet_void_outer_z0()],
            [eyelet_void_outer_y(), eyelet_void_outer_z1()],
            [eyelet_void_inner_y(), eyelet_void_inner_z1()]
        ],
        string_eyelet_w_x + 2*eps
    );
}

module polygon_cut_flipped_trapezoid_eyelet() {
    difference() {
        flipped_trapezoid_eyelet_solid_body();
        flipped_trapezoid_eyelet_inner_polygon_void();
    }
}

module bottom_insertion_notch() {
    if (bottom_insertion_notch_enabled)
        translate([0, 0, -eps])
            linear_extrude(height=flange_h+2*eps)
                hull() {
                    // Rounded inner end is tangent to the drum: no drum cut.
                    translate([0, drum_d/2+bottom_insertion_notch_w_x/2])
                        circle(d=bottom_insertion_notch_w_x);
                    // Carry the slot completely through the outer flange rim.
                    translate([0, flange_d/2+bottom_insertion_notch_w_x/2])
                        circle(d=bottom_insertion_notch_w_x);
                }
}

module capstan_shell(with_indicator_horn=true) {
    difference() {
        union() {
            cyl(drum_d, total_h);
            cyl(flange_d, flange_h);
            cyl(flange_d, flange_h, total_h-flange_h);
            if (string_eyelet_enabled) polygon_cut_flipped_trapezoid_eyelet();
            top_indicator_horn(with_indicator_horn && indicator_horn_enabled);
        }
        bottom_insertion_notch();
    }
}

module minute_orientation_mark() {
    translate([0, 0, total_h-minute_mark_depth_z])
        linear_extrude(height=minute_mark_depth_z+eps)
            hull()
                for (mark_y = [minute_mark_y0, minute_mark_y1])
                    translate([0, mark_y])
                        circle(d=minute_mark_w_x);
}

module minute_capstan() {
    difference() {
        // Printed upside down; omit the horn so the lower cavity prints cleanly.
        capstan_shell(with_indicator_horn=false);
        translate([0, 0, -eps])
            cylinder(d=minute_lower_clearance_d,
                     h=minute_lower_clearance_h+eps);
        translate([0, 0, -eps])
            cylinder(d=minute_lower_clearance_d+bore_mouth_extra, h=bore_mouth_h+eps);
        translate([0, 0, minute_lower_clearance_h])
            cylinder(d=minute_bore_d,
                     h=total_h-minute_lower_clearance_h+eps);
        minute_orientation_mark();
    }
}

module hour_capstan(bore_d=5.15) {
    difference() {
        capstan_shell(with_indicator_horn=true);
        translate([0, 0, -eps])
            cylinder(d=bore_d, h=total_h+2*eps);
        translate([0, 0, -eps])
            cylinder(d=bore_d+bore_mouth_extra, h=bore_mouth_h+eps);
    }
}

module breakaway_post(angle) {
    post_xy = [
        breakaway_post_radius*cos(angle),
        breakaway_post_radius*sin(angle)
    ];
    lower_flange_z1 = flange_h;
    upper_flange_z0 = total_h-flange_h;
    body_z0 = lower_flange_z1+breakaway_neck_h;
    body_z1 = upper_flange_z0-breakaway_neck_h;

    // Bottom snip neck, short rigid body, and top snip neck. The body remains
    // at the accessible outer edge and never approaches the eyelet sweep.
    translate([post_xy[0], post_xy[1], lower_flange_z1-eps])
        cylinder(d=breakaway_neck_d, h=breakaway_neck_h+eps);
    translate([post_xy[0], post_xy[1], body_z0-eps])
        cylinder(d=breakaway_body_d, h=body_z1-body_z0+2*eps);
    translate([post_xy[0], post_xy[1], body_z1])
        cylinder(d=breakaway_neck_d, h=breakaway_neck_h+eps);
}

module breakaway_post_set() {
    if (breakaway_supports_enabled)
        for (i=[0:breakaway_support_count-1])
            breakaway_post(i*360/breakaway_support_count);
}

module minute_capstan_print_layout() {
    // Former horn face on the bed; the recessed marker becomes a bed imprint.
    translate([0, 0, total_h])
        rotate([180, 0, 0])
            minute_capstan();
    breakaway_post_set();
}

module hour_capstan_print_layout(bore_d=5.15) {
    hour_capstan(bore_d);
    breakaway_post_set();
}

// Render minute + hour, matching the canonical file's deliverable pattern.
minute_capstan_print_layout();
for (i=[0:len(hour_bores)-1])
    translate([(i+1)*part_spacing_x, 0, 0])
        hour_capstan_print_layout(hour_bores[i]);
